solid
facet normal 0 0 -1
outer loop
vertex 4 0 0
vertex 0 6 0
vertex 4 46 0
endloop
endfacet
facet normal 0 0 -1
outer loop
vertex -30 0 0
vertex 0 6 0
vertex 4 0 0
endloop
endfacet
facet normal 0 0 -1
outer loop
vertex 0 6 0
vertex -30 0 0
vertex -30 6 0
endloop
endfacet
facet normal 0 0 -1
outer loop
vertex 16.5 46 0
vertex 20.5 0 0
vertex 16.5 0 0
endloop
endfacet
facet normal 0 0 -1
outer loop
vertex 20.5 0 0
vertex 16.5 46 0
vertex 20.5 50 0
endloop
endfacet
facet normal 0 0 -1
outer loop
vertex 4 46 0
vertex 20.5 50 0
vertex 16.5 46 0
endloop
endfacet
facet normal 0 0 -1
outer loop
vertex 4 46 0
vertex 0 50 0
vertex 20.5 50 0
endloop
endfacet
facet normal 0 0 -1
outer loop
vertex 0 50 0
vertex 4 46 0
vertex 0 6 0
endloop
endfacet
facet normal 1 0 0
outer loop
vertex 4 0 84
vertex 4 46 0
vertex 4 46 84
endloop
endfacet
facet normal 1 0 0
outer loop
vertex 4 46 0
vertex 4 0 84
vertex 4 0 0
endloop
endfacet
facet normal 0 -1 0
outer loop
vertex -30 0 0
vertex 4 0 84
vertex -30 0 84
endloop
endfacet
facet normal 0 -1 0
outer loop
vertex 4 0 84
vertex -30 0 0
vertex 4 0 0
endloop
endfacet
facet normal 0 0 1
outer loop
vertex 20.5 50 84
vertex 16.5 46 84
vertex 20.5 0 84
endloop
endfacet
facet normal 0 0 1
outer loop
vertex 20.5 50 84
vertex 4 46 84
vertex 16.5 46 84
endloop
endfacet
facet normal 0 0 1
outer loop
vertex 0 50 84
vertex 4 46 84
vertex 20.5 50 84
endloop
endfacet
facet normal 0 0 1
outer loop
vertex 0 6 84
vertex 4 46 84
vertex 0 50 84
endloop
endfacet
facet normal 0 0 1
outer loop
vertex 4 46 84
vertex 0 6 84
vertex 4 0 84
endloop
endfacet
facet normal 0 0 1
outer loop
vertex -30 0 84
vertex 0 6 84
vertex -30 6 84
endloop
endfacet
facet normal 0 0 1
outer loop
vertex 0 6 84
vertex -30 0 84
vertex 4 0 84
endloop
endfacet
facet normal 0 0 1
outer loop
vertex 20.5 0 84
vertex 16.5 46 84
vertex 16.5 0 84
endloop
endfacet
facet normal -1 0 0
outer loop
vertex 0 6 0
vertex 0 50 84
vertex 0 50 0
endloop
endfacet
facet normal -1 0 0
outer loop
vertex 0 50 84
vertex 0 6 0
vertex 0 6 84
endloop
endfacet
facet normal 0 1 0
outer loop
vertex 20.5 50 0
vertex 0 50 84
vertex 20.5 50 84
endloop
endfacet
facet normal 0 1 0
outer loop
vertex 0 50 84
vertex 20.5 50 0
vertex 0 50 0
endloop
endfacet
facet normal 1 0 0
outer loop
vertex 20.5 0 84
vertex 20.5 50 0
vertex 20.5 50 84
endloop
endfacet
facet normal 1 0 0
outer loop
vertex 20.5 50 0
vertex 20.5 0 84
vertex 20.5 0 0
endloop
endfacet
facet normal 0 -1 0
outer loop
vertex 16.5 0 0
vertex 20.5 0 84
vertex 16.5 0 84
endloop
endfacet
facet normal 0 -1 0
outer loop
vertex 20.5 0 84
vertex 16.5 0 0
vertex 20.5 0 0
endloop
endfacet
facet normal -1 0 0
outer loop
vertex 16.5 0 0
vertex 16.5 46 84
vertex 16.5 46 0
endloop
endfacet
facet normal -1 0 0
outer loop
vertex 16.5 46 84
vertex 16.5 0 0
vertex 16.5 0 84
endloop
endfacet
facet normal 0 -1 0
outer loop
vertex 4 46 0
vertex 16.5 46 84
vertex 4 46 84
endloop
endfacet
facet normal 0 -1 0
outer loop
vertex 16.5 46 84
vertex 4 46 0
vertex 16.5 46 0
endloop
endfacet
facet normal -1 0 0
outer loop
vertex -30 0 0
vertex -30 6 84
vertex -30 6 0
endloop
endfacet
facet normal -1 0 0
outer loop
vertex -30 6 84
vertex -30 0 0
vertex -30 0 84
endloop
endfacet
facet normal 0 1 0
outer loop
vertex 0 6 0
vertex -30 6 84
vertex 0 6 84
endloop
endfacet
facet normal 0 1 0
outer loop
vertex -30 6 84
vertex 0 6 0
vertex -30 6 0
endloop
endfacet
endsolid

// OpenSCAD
// 8-tube PCR strip holder that hooks over a 12 mm bucket wall
// Printed as used: rests on XY plane (z=0), builds upward (+Z), centred on x=0.

$fn = 64;

// ---- Overall extrusion (X direction) ----
L = 84;          // extrusion length along X (centred on x=0)

// ---- Upside-down U profile (YZ plane) ----
z0 = 0;          // bottom of legs (sits on XY plane)
z1 = 50;        // top of legs / bridge
y_inner_lo = 0;  // inner leg, low Y
y_inner_hi = 4;  // inner leg, high Y  (4 mm thick)
y_outer_lo = 16.5; // outer leg, low Y
y_outer_hi = 20.5; // outer leg, high Y (4 mm thick)
z_bridge_lo = 46;  // bridge bottom (leaves 12.5 mm gap for 12 mm wall)
z_bridge_hi = 50;  // bridge top

// ---- Flat ledge (into the ice, toward -Y) ----
y_ledge_lo = -30; // ledge extends from y=0 to y=-30
y_ledge_hi = 0;
z_ledge_lo = 0;   // 6 mm thick ledge
z_ledge_hi = 6;

// ---- Tube holes ----
hole_d = 6.4;    // through-hole diameter
hole_pitch = 9;  // spacing along X
n_holes = 8;     // number of holes
y_hole = -15;    // hole centre Y

// ---- Build the solid ----
difference() {
    union() {
        // Inner leg
        linear_extrude(L)
            polygon([
                [y_inner_lo, z0],
                [y_inner_hi, z0],
                [y_inner_hi, z1],
                [y_inner_lo, z1]
            ]);

        // Outer leg
        linear_extrude(L)
            polygon([
                [y_outer_lo, z0],
                [y_outer_hi, z0],
                [y_outer_hi, z1],
                [y_outer_lo, z1]
            ]);

        // Bridge joining the two legs at the top
        linear_extrude(L)
            polygon([
                [y_inner_lo, z_bridge_lo],
                [y_outer_hi, z_bridge_lo],
                [y_outer_hi, z_bridge_hi],
                [y_inner_lo, z_bridge_hi]
            ]);

        // Flat ledge reaching toward -Y from the foot of the inner leg
        linear_extrude(L)
            polygon([
                [y_ledge_lo, z_ledge_lo],
                [y_ledge_hi, z_ledge_lo],
                [y_ledge_hi, z_ledge_hi],
                [y_ledge_lo, z_ledge_hi]
            ]);
    }

    // Eight vertical 6.4 mm through-holes in the ledge, 9 mm apart along X, centred, at y=-15
    for (i = [0 : n_holes - 1]) {
        x_hole = (i - (n_holes - 1) / 2) * hole_pitch;
        translate([x_hole, y_hole, z_ledge_lo - 1])
            cylinder(h = (z_ledge_hi - z_ledge_lo) + 2, r = hole_d / 2, $fn = 64);
    }
}
